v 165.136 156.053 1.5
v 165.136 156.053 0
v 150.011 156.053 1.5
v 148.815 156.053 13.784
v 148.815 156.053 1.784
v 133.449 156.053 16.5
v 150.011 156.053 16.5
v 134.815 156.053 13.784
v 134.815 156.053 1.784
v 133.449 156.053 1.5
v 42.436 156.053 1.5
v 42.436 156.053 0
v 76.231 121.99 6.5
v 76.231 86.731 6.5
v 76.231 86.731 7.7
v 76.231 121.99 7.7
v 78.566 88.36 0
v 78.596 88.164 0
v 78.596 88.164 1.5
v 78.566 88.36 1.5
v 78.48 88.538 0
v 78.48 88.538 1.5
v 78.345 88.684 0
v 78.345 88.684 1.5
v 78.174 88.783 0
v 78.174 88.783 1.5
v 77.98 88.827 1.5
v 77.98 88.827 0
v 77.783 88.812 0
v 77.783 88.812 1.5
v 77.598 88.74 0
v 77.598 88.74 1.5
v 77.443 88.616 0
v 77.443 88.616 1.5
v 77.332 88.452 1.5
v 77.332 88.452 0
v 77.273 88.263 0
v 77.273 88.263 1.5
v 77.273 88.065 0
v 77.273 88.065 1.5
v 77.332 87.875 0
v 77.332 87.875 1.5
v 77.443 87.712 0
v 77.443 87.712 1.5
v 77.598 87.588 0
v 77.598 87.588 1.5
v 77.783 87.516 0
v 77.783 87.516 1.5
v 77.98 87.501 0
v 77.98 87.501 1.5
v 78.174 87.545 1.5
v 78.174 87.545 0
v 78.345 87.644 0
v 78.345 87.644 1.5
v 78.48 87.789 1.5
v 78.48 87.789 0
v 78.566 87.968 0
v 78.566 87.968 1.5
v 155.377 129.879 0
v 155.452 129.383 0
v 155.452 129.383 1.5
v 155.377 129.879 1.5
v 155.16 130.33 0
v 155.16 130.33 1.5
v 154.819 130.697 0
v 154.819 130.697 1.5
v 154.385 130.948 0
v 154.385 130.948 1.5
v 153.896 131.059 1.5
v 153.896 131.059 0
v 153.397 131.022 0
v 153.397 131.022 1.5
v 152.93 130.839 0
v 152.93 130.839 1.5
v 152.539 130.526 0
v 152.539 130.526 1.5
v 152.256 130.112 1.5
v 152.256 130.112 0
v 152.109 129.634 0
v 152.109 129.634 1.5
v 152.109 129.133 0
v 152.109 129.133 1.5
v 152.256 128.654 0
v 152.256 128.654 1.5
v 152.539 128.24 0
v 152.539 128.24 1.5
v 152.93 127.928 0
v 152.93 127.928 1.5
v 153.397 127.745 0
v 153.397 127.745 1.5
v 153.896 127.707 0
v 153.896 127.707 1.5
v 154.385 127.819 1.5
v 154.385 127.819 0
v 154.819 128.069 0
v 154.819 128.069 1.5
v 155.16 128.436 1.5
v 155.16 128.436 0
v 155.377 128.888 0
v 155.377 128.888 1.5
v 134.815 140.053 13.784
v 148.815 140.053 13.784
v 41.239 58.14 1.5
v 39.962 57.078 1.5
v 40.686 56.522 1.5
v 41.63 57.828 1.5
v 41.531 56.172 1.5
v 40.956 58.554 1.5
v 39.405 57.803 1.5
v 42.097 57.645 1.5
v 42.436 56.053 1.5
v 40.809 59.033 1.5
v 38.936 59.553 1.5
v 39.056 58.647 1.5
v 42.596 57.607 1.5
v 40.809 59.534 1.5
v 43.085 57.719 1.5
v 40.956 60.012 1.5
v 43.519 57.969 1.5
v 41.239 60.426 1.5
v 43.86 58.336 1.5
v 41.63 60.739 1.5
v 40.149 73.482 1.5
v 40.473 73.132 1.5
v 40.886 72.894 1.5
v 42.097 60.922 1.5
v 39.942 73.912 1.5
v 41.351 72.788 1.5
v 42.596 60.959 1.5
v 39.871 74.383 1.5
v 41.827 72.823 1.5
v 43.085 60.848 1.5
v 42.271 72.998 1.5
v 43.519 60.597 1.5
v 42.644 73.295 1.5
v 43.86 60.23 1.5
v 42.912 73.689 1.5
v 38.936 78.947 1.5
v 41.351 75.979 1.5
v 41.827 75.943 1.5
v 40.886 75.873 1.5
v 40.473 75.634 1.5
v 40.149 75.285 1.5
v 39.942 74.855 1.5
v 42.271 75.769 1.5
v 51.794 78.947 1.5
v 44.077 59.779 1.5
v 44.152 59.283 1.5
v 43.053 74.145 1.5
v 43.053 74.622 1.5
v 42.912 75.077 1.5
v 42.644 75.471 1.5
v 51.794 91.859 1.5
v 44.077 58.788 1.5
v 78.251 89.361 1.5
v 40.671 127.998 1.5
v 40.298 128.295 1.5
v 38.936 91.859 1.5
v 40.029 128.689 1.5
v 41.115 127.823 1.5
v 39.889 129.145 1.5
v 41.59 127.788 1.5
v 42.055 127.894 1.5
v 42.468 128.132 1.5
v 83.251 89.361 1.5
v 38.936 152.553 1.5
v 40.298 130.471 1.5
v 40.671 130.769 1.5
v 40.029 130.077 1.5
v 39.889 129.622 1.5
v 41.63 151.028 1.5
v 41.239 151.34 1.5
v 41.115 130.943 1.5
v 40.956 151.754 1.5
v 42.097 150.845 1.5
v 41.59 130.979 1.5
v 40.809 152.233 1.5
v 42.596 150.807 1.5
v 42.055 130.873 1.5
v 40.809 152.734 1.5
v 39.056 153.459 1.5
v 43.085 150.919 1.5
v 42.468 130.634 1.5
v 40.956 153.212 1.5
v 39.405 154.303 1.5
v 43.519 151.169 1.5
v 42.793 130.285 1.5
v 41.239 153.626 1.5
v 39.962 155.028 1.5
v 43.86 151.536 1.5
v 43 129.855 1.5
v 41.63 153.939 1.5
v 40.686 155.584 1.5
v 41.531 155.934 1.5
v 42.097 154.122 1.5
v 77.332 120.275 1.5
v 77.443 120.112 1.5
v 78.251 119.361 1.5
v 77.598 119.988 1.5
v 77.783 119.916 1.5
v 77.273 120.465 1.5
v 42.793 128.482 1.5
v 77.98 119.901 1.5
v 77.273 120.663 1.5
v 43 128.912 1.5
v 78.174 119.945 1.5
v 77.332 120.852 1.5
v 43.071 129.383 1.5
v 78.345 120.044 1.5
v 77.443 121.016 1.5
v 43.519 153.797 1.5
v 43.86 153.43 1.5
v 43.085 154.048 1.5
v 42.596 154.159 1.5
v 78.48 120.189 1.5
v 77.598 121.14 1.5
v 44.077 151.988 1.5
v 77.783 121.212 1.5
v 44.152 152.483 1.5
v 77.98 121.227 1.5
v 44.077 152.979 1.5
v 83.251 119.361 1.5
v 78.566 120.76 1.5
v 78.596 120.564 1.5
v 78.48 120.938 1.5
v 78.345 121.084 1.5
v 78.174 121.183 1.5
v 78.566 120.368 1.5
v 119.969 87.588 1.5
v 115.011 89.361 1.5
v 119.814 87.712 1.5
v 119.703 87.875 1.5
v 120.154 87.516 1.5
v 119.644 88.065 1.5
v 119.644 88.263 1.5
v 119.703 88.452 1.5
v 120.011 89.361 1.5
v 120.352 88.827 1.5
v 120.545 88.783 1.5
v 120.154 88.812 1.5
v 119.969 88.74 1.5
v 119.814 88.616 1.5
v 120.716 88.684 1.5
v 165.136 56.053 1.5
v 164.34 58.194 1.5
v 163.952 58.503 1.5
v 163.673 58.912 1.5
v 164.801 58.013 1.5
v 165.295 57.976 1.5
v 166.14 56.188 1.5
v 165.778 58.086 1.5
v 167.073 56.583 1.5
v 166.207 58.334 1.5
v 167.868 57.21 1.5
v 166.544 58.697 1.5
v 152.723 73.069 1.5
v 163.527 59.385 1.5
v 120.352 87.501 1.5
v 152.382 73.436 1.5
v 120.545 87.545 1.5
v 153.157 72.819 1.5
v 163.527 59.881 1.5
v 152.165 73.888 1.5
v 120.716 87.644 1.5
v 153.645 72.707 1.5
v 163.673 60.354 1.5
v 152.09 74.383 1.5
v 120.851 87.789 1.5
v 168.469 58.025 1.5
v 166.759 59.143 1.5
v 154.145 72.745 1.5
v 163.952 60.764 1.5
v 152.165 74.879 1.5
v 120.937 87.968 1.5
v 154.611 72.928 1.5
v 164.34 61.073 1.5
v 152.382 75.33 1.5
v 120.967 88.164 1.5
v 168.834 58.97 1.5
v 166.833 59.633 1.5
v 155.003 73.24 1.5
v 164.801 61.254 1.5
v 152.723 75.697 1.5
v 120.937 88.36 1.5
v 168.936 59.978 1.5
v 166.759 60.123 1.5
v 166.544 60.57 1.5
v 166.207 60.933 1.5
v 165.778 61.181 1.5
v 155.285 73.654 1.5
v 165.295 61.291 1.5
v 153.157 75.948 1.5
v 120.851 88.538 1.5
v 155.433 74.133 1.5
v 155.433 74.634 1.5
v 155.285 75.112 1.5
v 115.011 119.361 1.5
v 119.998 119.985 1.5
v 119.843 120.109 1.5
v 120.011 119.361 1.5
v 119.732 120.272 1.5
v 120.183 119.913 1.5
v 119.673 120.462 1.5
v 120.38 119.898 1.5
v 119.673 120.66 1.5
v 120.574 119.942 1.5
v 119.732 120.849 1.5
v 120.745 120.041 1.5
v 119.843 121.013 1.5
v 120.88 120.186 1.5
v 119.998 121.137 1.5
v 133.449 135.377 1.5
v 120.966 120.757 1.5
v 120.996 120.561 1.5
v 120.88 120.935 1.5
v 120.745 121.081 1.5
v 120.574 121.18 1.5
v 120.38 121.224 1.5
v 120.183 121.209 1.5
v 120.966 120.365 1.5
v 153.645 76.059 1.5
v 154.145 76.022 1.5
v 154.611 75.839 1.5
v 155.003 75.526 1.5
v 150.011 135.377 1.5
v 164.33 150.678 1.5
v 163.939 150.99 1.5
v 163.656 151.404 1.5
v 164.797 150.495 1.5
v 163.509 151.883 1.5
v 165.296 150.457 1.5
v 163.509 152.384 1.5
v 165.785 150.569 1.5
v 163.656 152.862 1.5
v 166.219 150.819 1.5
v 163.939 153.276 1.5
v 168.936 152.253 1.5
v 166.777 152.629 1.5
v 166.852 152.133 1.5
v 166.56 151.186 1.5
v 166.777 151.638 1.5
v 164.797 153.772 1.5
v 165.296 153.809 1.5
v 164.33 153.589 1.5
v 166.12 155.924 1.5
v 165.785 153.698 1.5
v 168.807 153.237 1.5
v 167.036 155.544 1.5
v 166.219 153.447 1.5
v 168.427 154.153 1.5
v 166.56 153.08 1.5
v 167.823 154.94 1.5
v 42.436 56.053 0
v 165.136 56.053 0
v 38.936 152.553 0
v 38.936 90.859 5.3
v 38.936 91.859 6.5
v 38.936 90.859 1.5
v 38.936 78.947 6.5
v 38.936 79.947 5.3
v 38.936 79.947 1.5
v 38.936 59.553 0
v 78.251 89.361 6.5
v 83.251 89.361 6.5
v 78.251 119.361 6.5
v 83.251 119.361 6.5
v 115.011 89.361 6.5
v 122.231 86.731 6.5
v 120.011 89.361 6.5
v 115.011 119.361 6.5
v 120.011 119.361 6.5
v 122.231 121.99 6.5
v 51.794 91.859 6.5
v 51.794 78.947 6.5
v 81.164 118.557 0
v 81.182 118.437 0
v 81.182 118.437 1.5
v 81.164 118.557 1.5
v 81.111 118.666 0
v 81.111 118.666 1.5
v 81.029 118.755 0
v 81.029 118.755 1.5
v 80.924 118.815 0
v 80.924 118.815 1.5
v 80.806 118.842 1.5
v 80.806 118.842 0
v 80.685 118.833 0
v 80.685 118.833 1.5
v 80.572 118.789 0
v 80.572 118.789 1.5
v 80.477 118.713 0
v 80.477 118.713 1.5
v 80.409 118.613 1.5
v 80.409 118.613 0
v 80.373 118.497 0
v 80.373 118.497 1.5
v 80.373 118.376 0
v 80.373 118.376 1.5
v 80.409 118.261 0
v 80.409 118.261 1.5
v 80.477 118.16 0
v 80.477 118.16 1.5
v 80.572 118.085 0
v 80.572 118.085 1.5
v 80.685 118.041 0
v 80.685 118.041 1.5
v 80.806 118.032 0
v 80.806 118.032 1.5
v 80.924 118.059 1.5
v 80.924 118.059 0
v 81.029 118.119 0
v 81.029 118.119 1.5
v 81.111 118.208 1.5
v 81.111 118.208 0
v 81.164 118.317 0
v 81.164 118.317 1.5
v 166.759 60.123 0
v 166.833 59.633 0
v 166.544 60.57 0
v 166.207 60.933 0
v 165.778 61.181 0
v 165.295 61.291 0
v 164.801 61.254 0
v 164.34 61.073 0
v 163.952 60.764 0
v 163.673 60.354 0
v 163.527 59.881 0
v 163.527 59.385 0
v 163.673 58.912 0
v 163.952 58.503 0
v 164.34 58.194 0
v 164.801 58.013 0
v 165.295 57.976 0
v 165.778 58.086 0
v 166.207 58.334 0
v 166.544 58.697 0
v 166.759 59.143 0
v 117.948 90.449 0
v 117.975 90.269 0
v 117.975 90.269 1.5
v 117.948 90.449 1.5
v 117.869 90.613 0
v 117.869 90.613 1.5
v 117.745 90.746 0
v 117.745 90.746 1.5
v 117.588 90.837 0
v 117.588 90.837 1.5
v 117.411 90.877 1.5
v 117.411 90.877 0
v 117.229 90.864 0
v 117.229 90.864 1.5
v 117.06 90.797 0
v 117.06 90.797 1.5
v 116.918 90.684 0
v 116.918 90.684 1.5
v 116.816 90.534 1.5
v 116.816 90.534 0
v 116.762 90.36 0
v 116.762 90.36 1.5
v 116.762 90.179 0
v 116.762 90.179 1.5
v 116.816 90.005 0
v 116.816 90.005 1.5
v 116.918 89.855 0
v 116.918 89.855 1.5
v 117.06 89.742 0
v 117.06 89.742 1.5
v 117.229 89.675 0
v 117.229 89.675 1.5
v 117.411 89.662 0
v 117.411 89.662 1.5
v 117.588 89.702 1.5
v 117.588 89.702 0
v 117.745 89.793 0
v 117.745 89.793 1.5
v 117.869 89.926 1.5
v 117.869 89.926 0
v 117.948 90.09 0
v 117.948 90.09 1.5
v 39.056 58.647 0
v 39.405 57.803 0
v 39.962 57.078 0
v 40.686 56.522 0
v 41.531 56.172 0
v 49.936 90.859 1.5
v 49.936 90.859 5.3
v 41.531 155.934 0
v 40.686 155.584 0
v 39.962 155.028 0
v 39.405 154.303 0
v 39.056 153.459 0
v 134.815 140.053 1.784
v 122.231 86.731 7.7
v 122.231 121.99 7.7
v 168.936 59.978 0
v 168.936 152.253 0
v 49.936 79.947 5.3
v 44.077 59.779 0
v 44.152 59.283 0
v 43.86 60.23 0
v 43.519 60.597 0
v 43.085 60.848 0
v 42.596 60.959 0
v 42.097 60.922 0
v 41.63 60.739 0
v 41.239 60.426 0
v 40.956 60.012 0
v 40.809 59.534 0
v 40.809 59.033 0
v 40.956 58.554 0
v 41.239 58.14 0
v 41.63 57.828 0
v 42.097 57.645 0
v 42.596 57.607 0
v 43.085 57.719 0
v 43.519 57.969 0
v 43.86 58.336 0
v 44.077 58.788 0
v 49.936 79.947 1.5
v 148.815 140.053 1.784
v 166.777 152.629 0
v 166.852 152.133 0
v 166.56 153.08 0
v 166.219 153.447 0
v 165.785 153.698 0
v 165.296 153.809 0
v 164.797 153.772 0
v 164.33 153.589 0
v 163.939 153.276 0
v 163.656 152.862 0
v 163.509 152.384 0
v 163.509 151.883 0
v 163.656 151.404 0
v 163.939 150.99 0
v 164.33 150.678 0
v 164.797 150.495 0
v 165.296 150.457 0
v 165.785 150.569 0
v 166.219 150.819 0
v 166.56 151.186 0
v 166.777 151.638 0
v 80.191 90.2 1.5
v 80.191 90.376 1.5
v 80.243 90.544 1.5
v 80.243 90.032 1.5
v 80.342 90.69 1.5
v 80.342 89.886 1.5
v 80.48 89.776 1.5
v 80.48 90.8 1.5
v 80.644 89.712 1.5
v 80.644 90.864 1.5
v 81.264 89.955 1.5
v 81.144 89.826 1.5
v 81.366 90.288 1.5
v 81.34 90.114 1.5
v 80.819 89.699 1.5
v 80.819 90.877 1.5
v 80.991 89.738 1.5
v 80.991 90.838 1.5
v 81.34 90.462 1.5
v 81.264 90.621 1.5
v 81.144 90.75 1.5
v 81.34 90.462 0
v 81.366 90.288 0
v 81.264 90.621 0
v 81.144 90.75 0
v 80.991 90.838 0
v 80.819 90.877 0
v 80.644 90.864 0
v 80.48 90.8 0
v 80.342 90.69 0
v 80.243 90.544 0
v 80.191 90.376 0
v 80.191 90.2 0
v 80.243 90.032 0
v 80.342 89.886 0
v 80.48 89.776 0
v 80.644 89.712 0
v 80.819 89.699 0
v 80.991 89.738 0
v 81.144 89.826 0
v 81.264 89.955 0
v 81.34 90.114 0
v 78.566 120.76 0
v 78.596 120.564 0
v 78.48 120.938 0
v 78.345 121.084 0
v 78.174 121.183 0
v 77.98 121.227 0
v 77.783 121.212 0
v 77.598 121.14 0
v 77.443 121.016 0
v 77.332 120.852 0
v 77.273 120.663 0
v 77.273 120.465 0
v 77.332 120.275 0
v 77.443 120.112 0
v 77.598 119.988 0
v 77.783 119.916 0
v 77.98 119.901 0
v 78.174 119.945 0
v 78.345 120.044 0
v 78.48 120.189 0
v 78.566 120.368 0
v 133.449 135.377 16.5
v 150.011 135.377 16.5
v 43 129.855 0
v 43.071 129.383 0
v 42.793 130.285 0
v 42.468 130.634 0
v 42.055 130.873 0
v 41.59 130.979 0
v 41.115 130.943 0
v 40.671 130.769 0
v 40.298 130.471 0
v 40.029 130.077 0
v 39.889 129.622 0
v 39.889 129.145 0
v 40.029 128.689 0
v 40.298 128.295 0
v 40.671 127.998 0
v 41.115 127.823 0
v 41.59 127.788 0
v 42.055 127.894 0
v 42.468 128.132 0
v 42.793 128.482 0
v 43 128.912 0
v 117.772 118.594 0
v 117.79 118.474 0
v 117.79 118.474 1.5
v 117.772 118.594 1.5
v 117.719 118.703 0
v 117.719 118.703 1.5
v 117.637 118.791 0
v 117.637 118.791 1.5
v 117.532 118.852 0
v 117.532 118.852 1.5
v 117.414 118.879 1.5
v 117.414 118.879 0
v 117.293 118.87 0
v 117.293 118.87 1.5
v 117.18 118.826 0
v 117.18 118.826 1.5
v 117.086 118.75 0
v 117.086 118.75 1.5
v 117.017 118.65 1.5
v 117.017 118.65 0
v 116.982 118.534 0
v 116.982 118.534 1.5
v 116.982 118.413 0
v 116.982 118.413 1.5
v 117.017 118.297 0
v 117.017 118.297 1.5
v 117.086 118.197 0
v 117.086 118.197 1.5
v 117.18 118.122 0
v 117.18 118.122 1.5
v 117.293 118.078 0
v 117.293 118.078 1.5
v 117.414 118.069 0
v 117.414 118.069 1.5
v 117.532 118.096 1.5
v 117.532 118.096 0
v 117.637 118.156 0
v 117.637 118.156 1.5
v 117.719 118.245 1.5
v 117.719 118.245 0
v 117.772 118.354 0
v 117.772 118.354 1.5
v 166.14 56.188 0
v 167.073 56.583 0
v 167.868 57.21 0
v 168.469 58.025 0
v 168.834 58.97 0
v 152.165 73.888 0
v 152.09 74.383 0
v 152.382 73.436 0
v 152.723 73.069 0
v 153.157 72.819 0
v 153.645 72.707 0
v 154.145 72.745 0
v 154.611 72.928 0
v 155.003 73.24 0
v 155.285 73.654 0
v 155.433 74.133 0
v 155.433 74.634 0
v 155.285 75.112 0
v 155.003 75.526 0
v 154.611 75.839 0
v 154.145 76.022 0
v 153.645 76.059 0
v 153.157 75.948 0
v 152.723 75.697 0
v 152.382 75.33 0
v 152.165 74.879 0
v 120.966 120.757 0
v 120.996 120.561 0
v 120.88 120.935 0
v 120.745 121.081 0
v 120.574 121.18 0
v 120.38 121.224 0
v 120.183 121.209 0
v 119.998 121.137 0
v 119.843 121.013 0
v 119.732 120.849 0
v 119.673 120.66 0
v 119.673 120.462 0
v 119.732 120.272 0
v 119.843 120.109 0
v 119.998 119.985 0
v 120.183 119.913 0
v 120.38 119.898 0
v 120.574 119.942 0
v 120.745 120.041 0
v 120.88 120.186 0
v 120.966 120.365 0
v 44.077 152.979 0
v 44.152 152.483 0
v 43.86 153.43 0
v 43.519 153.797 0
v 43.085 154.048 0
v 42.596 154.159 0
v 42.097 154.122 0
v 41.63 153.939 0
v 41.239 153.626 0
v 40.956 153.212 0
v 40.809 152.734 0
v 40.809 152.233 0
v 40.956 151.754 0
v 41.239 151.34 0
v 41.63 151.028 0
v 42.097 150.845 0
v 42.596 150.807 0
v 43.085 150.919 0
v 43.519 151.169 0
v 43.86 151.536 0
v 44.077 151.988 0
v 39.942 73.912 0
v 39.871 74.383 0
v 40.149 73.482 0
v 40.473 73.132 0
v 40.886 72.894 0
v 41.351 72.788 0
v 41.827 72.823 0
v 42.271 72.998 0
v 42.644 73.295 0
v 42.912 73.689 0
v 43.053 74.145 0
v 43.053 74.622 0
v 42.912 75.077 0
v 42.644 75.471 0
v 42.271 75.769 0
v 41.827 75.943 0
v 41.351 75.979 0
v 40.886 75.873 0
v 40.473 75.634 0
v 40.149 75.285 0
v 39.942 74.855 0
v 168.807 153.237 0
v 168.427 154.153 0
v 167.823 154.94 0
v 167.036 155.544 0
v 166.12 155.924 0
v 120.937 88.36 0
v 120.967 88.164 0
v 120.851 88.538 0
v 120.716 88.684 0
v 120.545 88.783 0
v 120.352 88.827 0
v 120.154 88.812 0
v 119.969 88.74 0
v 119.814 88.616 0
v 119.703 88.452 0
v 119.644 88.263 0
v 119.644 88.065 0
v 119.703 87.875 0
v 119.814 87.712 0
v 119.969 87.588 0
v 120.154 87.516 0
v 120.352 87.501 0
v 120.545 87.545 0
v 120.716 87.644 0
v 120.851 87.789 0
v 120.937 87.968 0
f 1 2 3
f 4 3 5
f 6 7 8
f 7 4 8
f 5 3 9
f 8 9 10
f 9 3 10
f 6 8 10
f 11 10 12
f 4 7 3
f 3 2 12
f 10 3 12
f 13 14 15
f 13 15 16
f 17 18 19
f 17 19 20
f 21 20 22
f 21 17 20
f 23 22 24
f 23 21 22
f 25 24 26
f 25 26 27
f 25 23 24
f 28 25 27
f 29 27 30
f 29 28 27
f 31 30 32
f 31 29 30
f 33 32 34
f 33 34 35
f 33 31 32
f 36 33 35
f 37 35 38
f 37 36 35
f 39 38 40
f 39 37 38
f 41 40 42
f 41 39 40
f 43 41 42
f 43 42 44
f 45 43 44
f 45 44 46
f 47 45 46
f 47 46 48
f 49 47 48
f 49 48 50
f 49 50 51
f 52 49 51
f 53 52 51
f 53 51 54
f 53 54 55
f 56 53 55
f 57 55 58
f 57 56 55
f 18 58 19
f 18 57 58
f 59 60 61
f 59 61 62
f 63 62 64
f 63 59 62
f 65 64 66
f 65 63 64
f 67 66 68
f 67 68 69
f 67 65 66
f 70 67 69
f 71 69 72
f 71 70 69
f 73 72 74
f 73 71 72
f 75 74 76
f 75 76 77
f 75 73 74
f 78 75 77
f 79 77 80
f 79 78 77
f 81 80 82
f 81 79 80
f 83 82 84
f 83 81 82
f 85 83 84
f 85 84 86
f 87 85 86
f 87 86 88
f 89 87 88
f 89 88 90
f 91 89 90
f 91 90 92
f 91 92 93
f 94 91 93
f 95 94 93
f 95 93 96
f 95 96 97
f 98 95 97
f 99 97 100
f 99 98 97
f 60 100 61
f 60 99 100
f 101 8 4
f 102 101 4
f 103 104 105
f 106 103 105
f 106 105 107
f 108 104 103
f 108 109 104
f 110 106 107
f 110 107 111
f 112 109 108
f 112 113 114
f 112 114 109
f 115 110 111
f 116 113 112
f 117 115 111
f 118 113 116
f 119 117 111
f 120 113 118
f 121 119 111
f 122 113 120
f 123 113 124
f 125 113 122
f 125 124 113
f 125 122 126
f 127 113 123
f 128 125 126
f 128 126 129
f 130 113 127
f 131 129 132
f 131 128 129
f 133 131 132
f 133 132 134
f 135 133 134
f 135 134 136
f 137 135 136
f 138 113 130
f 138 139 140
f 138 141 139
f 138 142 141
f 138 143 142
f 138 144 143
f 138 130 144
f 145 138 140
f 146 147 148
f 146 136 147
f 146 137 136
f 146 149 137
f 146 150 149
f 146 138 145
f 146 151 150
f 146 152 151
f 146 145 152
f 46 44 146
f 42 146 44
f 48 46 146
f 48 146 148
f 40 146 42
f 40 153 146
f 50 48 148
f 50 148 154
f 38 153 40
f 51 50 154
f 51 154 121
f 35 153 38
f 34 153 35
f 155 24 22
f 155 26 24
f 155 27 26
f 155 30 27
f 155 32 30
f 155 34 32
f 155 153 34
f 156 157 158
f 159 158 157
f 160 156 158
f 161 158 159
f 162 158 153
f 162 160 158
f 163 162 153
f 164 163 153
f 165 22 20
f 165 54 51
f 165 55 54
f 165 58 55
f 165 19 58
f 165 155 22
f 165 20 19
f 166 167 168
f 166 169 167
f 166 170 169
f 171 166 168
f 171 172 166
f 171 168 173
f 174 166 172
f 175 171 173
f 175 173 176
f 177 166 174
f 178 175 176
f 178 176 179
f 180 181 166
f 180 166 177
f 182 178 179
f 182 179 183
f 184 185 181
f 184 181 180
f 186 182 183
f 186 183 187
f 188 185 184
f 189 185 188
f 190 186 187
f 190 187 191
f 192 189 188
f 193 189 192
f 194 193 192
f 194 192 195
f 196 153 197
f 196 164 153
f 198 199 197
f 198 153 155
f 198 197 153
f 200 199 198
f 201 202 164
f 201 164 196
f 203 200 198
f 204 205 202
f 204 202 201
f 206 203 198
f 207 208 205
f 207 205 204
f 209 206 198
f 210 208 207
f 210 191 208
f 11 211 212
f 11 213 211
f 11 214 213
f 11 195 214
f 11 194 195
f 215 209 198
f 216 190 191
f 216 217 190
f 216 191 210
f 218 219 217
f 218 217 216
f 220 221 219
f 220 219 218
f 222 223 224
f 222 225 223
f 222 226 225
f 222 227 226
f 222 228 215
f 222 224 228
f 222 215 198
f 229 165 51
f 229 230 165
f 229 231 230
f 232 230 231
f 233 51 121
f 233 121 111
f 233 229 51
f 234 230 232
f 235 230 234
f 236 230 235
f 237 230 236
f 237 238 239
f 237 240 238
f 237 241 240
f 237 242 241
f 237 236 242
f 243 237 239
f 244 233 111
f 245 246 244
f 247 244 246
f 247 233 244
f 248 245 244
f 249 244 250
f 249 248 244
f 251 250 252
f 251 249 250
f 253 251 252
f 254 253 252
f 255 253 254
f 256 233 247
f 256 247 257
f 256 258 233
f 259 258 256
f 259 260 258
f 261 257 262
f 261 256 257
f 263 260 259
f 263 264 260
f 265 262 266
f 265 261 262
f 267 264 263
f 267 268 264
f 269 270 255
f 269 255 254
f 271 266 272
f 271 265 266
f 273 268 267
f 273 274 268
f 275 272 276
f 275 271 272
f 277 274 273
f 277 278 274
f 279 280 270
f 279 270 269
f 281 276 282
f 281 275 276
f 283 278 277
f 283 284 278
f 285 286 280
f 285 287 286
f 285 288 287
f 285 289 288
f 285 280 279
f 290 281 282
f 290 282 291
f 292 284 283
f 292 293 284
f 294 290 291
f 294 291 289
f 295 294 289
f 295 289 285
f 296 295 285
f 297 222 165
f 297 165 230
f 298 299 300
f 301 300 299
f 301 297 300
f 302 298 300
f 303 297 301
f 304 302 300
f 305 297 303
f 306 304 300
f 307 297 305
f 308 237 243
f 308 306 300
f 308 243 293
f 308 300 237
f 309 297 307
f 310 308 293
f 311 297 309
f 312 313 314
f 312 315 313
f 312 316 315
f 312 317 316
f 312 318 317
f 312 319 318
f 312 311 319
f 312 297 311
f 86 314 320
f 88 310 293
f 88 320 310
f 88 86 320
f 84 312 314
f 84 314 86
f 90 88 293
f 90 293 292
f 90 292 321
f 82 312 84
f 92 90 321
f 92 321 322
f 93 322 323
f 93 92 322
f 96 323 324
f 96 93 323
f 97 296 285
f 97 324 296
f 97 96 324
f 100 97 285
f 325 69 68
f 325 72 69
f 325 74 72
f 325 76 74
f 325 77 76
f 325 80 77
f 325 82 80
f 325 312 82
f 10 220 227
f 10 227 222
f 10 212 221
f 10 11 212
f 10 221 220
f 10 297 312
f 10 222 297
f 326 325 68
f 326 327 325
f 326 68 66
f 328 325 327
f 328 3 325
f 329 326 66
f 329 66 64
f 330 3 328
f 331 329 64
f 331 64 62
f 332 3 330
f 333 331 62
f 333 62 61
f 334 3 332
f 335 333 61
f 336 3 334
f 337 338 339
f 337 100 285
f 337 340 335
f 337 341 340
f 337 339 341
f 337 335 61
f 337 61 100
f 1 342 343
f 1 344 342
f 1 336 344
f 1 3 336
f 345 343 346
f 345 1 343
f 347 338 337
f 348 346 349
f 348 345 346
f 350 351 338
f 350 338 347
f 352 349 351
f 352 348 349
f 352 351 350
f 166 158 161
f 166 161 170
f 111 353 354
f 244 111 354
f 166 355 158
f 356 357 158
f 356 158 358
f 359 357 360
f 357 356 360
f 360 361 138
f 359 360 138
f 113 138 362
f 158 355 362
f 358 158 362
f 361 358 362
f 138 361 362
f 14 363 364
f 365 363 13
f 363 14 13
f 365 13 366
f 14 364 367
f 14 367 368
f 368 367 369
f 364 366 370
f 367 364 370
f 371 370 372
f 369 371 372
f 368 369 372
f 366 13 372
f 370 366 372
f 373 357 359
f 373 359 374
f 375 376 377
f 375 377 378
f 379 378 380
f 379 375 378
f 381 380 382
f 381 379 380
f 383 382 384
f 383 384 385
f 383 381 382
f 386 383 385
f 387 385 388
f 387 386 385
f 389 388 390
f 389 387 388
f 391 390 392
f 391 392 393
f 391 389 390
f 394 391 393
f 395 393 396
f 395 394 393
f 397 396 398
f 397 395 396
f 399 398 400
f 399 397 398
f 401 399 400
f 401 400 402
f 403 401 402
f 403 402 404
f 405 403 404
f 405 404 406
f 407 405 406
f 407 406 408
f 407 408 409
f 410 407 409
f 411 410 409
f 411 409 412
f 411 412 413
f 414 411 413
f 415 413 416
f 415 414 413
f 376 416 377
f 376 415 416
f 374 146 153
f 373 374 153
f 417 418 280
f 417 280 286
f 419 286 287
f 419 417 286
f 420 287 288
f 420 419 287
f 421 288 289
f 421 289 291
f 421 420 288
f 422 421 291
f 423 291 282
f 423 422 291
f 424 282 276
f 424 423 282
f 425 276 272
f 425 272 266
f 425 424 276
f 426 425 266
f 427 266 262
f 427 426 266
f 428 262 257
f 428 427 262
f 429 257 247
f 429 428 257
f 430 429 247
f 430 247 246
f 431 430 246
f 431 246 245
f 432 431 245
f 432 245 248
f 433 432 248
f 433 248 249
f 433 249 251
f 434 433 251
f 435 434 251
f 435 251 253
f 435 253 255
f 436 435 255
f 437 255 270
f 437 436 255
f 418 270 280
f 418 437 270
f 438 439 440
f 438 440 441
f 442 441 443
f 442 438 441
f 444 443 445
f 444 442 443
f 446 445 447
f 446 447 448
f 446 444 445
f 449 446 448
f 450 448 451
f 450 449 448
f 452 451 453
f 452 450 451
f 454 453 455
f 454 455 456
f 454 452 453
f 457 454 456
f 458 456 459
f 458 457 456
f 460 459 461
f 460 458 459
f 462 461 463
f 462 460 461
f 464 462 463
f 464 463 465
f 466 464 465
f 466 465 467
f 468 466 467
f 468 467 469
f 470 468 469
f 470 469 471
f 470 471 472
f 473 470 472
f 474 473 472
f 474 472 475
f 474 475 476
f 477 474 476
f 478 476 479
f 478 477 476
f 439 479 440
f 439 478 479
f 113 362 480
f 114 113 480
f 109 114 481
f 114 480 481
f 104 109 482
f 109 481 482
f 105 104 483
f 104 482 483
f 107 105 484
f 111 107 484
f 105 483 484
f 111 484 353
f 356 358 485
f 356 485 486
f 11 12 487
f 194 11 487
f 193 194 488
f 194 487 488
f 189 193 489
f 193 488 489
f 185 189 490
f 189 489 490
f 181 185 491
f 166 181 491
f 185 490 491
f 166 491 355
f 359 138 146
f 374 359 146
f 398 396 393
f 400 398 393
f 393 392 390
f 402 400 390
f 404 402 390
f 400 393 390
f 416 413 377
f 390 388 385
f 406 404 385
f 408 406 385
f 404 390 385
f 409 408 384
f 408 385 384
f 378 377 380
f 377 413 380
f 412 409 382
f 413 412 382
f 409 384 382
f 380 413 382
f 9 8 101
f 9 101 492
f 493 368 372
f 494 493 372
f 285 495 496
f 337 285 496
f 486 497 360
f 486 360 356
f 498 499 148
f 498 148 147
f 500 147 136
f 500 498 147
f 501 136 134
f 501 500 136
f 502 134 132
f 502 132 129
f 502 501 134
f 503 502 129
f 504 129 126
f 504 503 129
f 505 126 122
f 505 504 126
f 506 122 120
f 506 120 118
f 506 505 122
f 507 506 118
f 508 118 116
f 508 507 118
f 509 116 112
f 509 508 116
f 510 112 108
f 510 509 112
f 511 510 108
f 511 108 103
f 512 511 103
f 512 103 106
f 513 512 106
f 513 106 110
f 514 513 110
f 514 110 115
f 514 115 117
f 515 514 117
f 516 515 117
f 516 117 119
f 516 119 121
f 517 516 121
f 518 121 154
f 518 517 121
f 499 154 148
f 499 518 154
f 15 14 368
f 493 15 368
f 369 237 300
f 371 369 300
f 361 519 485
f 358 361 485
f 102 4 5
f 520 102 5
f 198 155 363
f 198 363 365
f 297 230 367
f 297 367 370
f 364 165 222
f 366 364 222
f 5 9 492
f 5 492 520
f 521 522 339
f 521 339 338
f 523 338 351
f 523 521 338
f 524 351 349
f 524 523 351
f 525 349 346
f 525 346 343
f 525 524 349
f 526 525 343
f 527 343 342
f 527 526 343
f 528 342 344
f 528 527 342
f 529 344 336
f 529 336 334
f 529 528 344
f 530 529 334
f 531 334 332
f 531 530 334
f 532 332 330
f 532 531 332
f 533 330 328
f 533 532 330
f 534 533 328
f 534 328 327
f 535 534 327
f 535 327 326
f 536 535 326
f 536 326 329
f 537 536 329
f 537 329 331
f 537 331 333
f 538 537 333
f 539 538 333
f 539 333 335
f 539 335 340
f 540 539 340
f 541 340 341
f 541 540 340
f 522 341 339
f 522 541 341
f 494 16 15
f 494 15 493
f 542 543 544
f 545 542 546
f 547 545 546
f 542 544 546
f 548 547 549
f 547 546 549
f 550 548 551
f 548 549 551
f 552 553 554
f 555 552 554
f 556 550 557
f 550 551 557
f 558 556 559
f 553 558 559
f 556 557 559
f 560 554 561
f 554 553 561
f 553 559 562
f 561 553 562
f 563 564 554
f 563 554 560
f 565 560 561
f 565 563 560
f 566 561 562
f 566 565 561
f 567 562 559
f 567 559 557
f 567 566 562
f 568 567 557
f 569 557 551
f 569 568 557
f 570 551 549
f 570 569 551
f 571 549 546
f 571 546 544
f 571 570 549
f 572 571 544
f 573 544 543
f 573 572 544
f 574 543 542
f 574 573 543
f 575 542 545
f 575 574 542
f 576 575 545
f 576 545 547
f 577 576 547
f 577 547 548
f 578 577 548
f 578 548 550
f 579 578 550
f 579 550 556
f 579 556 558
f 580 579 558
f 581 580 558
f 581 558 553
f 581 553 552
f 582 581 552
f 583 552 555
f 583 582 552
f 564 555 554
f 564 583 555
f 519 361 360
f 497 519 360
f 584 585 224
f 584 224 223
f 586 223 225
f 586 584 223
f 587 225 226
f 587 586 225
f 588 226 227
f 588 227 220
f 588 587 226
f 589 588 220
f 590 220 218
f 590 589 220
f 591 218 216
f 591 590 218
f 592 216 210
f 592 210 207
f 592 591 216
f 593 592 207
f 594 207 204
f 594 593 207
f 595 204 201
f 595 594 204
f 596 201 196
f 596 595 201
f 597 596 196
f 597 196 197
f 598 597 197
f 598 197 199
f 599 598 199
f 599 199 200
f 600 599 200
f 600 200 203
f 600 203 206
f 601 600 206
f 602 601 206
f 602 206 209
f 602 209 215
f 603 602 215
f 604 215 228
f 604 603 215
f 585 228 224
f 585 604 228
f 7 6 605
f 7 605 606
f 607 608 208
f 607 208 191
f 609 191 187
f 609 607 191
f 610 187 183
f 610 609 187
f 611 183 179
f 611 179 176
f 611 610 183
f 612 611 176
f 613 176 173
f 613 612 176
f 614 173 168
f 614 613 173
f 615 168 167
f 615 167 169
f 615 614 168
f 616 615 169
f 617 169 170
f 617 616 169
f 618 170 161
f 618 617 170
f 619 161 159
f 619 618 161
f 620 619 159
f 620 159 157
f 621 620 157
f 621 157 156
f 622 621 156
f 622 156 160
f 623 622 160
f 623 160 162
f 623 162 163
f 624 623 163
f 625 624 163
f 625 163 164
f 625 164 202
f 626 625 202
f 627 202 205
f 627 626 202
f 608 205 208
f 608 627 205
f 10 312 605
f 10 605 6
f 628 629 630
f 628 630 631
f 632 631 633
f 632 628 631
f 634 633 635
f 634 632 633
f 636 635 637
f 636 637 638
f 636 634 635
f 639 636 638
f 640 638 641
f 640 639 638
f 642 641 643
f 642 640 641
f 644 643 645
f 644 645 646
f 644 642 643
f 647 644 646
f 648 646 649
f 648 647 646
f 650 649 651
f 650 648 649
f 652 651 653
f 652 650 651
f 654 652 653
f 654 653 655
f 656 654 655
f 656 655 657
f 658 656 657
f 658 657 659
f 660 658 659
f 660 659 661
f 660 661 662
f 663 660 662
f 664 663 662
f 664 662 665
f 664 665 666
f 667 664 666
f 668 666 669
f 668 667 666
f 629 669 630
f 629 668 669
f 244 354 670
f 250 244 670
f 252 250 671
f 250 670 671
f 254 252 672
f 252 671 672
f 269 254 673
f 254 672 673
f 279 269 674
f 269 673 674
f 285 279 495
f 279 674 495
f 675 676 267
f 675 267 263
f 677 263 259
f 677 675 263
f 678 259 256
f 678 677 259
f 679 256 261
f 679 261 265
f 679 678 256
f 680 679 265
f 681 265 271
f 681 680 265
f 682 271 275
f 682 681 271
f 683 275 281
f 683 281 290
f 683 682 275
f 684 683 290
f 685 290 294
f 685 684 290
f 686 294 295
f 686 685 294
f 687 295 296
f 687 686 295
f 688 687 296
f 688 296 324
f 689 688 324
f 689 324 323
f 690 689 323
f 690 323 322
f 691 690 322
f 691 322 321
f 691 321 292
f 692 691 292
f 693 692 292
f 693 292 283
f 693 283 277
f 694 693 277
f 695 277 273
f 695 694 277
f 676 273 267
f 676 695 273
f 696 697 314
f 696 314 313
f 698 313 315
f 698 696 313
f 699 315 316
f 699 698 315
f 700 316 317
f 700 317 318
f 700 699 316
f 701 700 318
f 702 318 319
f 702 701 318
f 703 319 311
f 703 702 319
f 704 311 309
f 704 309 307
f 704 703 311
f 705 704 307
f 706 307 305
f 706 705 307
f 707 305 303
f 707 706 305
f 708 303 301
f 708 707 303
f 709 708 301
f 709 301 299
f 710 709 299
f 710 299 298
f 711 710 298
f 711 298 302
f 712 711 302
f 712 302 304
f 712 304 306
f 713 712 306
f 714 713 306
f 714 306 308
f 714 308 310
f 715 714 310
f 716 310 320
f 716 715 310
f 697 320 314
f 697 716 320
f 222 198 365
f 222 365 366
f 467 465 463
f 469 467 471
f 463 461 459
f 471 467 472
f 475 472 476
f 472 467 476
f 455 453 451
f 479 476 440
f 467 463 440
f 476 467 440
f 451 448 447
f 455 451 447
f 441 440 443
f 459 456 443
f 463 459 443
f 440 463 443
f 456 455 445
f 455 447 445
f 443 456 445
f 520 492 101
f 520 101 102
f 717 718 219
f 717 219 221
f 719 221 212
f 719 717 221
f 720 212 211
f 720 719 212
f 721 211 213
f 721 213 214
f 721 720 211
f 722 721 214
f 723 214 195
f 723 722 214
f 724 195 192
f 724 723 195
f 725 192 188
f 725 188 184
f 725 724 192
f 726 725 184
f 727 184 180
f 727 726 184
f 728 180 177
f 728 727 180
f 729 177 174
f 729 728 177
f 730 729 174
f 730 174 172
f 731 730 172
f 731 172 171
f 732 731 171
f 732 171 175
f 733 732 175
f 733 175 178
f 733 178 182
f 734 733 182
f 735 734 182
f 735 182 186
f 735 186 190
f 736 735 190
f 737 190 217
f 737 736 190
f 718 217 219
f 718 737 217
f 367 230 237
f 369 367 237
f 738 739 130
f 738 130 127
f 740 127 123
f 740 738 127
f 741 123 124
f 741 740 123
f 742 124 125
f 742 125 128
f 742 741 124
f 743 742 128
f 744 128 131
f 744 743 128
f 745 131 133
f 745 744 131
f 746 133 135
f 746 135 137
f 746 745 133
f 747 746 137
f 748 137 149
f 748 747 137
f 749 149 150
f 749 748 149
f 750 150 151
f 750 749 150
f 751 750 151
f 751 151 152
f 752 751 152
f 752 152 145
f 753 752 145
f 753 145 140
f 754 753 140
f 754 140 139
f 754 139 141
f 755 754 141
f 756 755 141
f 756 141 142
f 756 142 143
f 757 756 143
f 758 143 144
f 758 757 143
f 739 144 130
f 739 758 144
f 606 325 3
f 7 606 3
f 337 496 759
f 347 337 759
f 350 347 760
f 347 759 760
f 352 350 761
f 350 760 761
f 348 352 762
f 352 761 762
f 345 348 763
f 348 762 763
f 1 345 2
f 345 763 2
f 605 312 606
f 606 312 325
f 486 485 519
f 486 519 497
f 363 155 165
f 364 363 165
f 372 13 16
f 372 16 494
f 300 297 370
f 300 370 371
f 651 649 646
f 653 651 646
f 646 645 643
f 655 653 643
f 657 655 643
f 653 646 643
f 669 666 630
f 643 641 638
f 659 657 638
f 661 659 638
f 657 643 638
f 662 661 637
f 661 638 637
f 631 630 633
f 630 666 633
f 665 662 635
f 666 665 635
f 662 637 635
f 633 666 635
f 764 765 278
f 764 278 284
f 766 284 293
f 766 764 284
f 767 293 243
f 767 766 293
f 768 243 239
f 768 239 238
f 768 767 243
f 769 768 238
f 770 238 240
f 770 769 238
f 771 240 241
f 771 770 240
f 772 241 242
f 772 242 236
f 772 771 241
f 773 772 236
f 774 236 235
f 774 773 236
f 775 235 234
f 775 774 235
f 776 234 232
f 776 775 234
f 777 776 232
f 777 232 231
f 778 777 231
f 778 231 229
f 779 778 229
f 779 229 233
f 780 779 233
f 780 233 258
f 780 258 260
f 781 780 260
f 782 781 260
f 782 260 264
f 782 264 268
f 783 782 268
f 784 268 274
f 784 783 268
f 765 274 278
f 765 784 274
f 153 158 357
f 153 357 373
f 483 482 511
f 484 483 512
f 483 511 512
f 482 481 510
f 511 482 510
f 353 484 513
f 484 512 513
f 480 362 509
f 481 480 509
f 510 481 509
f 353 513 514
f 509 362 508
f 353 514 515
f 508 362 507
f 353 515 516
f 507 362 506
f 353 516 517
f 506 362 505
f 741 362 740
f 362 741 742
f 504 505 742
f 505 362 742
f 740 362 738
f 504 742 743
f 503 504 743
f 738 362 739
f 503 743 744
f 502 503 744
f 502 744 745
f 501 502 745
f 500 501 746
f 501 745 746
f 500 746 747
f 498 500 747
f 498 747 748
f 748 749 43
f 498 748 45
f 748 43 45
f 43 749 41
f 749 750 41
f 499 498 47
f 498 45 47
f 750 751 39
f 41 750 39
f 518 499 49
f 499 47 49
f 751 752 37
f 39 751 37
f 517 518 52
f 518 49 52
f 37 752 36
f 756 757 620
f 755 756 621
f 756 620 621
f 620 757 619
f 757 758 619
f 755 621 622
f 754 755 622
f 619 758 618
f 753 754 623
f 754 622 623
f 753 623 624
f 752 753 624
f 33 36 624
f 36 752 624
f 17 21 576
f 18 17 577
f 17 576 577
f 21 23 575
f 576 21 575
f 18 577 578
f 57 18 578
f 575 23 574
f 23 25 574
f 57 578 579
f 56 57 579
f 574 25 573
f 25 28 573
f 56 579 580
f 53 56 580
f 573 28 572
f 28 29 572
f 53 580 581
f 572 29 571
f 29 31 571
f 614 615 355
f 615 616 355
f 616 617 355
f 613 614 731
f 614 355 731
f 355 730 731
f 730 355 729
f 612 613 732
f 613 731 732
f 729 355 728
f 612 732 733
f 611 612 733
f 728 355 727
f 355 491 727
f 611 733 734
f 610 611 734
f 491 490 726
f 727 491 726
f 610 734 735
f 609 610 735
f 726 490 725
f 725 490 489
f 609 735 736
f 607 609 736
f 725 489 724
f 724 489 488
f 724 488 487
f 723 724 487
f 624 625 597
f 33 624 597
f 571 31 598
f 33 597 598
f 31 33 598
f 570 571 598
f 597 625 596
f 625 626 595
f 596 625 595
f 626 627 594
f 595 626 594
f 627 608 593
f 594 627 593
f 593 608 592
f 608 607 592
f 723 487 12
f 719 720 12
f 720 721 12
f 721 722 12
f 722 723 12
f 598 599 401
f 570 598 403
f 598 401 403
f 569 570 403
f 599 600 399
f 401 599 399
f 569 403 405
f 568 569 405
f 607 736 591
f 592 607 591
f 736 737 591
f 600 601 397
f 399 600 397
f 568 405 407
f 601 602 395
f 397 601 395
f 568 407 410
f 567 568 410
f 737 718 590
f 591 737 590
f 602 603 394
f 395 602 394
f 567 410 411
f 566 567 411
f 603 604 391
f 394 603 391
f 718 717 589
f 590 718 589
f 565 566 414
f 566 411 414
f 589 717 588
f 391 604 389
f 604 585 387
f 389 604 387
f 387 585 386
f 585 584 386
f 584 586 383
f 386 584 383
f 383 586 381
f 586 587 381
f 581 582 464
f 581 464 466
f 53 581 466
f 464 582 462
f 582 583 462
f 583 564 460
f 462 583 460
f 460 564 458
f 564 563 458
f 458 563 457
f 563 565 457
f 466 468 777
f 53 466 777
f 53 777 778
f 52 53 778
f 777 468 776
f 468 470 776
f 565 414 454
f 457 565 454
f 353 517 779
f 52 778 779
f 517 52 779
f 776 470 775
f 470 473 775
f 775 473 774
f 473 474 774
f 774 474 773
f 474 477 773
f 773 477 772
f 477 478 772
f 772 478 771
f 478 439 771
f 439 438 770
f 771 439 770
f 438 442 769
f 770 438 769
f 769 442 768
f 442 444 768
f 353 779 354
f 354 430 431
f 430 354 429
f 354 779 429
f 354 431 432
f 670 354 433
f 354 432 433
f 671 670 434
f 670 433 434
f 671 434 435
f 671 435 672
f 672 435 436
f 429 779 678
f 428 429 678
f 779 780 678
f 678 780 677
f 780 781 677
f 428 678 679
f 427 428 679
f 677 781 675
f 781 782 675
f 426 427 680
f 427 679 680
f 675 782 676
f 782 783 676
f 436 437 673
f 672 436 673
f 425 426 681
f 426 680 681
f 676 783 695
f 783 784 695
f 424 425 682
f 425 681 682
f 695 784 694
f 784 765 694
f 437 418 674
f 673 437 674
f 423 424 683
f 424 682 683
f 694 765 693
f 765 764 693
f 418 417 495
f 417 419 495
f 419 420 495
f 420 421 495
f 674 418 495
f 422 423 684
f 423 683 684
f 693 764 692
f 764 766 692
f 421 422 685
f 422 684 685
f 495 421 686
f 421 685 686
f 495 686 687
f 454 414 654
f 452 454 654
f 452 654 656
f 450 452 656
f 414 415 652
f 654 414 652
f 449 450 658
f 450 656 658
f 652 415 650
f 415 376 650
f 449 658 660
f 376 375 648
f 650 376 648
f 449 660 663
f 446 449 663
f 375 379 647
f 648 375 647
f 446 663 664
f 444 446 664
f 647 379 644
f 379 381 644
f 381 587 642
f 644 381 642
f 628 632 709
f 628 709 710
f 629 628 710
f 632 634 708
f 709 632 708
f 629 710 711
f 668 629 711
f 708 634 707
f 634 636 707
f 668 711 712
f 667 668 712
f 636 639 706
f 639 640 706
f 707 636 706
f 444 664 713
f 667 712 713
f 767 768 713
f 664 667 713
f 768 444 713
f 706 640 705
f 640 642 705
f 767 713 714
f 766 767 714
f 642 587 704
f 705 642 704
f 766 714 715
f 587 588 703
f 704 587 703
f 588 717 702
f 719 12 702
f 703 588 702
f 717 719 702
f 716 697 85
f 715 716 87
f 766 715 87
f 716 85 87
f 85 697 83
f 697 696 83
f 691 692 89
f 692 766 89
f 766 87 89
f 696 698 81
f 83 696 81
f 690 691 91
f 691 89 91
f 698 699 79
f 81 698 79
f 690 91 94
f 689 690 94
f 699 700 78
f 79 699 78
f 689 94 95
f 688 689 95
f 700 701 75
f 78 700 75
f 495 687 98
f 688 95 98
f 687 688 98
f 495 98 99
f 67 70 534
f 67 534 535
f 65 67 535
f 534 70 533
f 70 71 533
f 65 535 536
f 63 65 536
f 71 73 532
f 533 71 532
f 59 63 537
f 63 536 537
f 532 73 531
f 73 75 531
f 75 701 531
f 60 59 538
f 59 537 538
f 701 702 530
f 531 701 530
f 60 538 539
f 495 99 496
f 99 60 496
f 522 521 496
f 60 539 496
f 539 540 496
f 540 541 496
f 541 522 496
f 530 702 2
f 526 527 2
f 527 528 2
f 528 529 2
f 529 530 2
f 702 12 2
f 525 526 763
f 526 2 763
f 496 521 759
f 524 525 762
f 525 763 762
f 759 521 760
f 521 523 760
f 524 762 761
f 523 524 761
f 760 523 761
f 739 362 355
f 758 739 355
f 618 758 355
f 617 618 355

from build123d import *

# Parameters (mm, degrees)
SKETCH_1_R          = 1.680805835
SKETCH_1_R_2        = 0.406348663
SKETCH_1_R_3        = 0.591052601
SKETCH_1_R_4        = 0.609522995
SKETCH_1_R_5        = 0.664934176
SKETCH_1_R_6        = 1.662335441
SKETCH_1_R_7        = 1.6
EXTRUDE_2_DEPTH     = 1.5
SKETCH_2_W          = 5
SKETCH_2_H          = 30
EXTRUDE_3_DEPTH     = 5
SKETCH_3_W          = 46
SKETCH_3_H          = 35.259040571
EXTRUDE_4_DEPTH     = 1.2
SKETCH_4_W          = 16.562645757
SKETCH_4_H          = 20.676210758
EXTRUDE_5_DEPTH     = 15
SKETCH_5_W          = 14
SKETCH_5_H          = 12
CUT_EXTRUDE_1_DEPTH = 16
SKETCH_6_W          = 12.857554965
SKETCH_6_H          = 12.912362425
EXTRUDE_6_DEPTH     = 5
SKETCH_9_W          = 3.8
SKETCH_9_H          = 10.912362425
CUT_EXTRUDE_2_DEPTH = 11


with BuildPart() as part:
    # 草图1 → 凸台-拉伸2 (new body)
    with BuildSketch(Plane.XY):
        with BuildLine():
            Line((42.436427683, 56.053220537), (165.136427683, 56.053220537))
            ThreePointArc((165.136427683, 56.053220537), (167.867822265, 57.210483747), (168.936427683, 59.977767064))
            Line((168.936427683, 59.977767064), (168.936427683, 152.253220537))
            ThreePointArc((168.936427683, 152.253220537), (167.823433451, 154.940226305), (165.136427683, 156.053220537))
            Line((165.136427683, 156.053220537), (42.436427683, 156.053220537))
            ThreePointArc((42.436427683, 156.053220537), (39.961553949, 155.028094271), (38.936427683, 152.553220537))
            Line((38.936427683, 152.553220537), (38.936427683, 59.553220537))
            ThreePointArc((38.936427683, 59.553220537), (39.961553949, 57.078346802), (42.436427683, 56.053220537))
        make_face()
        with Locations((153.770781099, 129.383220537)):
            Circle(SKETCH_1_R, mode=Mode.SUBTRACT)
        with Locations((117.383571785, 118.473779489)):
            Circle(SKETCH_1_R_2, mode=Mode.SUBTRACT)
        with Locations((80.77524922, 90.287954645)):
            Circle(SKETCH_1_R_3, mode=Mode.SUBTRACT)
        with Locations((117.36509862, 90.269480326)):
            Circle(SKETCH_1_R_4, mode=Mode.SUBTRACT)
        with Locations((80.775251991, 118.436830852)):
            Circle(SKETCH_1_R_2, mode=Mode.SUBTRACT)
        with Locations((77.930808577, 120.563856588)):
            Circle(SKETCH_1_R_5, mode=Mode.SUBTRACT)
        with Locations((120.330808475, 120.56092691)):
            Circle(SKETCH_1_R_5, mode=Mode.SUBTRACT)
        with Locations((120.301889386, 88.163856588)):
            Circle(SKETCH_1_R_5, mode=Mode.SUBTRACT)
        with Locations((77.930808577, 88.163856588)):
            Circle(SKETCH_1_R_5, mode=Mode.SUBTRACT)
        with Locations((165.170781099, 59.633220537)):
            Circle(SKETCH_1_R_6, mode=Mode.SUBTRACT)
        with Locations((165.170781099, 152.133220537)):
            Circle(SKETCH_1_R, mode=Mode.SUBTRACT)
        with Locations((42.470781099, 152.483220537)):
            Circle(SKETCH_1_R, mode=Mode.SUBTRACT)
        with Locations((42.470781099, 59.283220537)):
            Circle(SKETCH_1_R, mode=Mode.SUBTRACT)
        with Locations(Location((153.770781099, 74.383220537, 0), (0, 0, 180))):
            Circle(SKETCH_1_R, mode=Mode.SUBTRACT)
        with Locations(Location((41.470781099, 74.383220537, 0), (0, 0, 180))):
            Circle(SKETCH_1_R_7, mode=Mode.SUBTRACT)
        with Locations((41.470781099, 129.383220537)):
            Circle(SKETCH_1_R_7, mode=Mode.SUBTRACT)
    extrude(amount=EXTRUDE_2_DEPTH)

    # 草图2 → 凸台-拉伸3 (add)
    with BuildSketch(Plane.XY.offset(1.5)):
        with Locations((80.750808475, 104.36092691)):
            Rectangle(SKETCH_2_W, SKETCH_2_H)
        with Locations((117.510808475, 104.36092691)):
            Rectangle(SKETCH_2_W, SKETCH_2_H)
    extrude(amount=EXTRUDE_3_DEPTH)

    # 草图3 → 凸台-拉伸4 (add)
    with BuildSketch(Plane.XY.offset(6.5)):
        with Locations((99.230808475, 104.360926909)):
            Rectangle(SKETCH_3_W, SKETCH_3_H)
    extrude(amount=EXTRUDE_4_DEPTH)

    # 草图4 → 凸台-拉伸5 (add)
    with BuildSketch(Plane.XY.offset(1.5)):
        with Locations((141.730083201, 145.715115158)):
            Rectangle(SKETCH_4_W, SKETCH_4_H)
    extrude(amount=EXTRUDE_5_DEPTH)

    # 草图5 → 切除-拉伸1 (cut)
    with BuildSketch(Plane(origin=(0, 156.053220537, 0), x_dir=(1, 0, 0), z_dir=(0, 1, 0))):
        with Locations((141.815149852, -7.784103515)):
            Rectangle(SKETCH_5_W, SKETCH_5_H)
    extrude(amount=-CUT_EXTRUDE_1_DEPTH, mode=Mode.SUBTRACT)

    # 草图6 → 凸台-拉伸6 (add)
    with BuildSketch(Plane.XY.offset(1.5)):
        with Locations((45.365205166, 85.403032826)):
            Rectangle(SKETCH_6_W, SKETCH_6_H)
    extrude(amount=EXTRUDE_6_DEPTH)

    # 草图9 → 切除-拉伸2 (cut)
    with BuildSketch(Plane.ZY.offset(-38.936427683)):
        with Locations((3.4, 85.403032826)):
            Rectangle(SKETCH_9_W, SKETCH_9_H)
    extrude(amount=-CUT_EXTRUDE_2_DEPTH, mode=Mode.SUBTRACT)


solid = part.part
